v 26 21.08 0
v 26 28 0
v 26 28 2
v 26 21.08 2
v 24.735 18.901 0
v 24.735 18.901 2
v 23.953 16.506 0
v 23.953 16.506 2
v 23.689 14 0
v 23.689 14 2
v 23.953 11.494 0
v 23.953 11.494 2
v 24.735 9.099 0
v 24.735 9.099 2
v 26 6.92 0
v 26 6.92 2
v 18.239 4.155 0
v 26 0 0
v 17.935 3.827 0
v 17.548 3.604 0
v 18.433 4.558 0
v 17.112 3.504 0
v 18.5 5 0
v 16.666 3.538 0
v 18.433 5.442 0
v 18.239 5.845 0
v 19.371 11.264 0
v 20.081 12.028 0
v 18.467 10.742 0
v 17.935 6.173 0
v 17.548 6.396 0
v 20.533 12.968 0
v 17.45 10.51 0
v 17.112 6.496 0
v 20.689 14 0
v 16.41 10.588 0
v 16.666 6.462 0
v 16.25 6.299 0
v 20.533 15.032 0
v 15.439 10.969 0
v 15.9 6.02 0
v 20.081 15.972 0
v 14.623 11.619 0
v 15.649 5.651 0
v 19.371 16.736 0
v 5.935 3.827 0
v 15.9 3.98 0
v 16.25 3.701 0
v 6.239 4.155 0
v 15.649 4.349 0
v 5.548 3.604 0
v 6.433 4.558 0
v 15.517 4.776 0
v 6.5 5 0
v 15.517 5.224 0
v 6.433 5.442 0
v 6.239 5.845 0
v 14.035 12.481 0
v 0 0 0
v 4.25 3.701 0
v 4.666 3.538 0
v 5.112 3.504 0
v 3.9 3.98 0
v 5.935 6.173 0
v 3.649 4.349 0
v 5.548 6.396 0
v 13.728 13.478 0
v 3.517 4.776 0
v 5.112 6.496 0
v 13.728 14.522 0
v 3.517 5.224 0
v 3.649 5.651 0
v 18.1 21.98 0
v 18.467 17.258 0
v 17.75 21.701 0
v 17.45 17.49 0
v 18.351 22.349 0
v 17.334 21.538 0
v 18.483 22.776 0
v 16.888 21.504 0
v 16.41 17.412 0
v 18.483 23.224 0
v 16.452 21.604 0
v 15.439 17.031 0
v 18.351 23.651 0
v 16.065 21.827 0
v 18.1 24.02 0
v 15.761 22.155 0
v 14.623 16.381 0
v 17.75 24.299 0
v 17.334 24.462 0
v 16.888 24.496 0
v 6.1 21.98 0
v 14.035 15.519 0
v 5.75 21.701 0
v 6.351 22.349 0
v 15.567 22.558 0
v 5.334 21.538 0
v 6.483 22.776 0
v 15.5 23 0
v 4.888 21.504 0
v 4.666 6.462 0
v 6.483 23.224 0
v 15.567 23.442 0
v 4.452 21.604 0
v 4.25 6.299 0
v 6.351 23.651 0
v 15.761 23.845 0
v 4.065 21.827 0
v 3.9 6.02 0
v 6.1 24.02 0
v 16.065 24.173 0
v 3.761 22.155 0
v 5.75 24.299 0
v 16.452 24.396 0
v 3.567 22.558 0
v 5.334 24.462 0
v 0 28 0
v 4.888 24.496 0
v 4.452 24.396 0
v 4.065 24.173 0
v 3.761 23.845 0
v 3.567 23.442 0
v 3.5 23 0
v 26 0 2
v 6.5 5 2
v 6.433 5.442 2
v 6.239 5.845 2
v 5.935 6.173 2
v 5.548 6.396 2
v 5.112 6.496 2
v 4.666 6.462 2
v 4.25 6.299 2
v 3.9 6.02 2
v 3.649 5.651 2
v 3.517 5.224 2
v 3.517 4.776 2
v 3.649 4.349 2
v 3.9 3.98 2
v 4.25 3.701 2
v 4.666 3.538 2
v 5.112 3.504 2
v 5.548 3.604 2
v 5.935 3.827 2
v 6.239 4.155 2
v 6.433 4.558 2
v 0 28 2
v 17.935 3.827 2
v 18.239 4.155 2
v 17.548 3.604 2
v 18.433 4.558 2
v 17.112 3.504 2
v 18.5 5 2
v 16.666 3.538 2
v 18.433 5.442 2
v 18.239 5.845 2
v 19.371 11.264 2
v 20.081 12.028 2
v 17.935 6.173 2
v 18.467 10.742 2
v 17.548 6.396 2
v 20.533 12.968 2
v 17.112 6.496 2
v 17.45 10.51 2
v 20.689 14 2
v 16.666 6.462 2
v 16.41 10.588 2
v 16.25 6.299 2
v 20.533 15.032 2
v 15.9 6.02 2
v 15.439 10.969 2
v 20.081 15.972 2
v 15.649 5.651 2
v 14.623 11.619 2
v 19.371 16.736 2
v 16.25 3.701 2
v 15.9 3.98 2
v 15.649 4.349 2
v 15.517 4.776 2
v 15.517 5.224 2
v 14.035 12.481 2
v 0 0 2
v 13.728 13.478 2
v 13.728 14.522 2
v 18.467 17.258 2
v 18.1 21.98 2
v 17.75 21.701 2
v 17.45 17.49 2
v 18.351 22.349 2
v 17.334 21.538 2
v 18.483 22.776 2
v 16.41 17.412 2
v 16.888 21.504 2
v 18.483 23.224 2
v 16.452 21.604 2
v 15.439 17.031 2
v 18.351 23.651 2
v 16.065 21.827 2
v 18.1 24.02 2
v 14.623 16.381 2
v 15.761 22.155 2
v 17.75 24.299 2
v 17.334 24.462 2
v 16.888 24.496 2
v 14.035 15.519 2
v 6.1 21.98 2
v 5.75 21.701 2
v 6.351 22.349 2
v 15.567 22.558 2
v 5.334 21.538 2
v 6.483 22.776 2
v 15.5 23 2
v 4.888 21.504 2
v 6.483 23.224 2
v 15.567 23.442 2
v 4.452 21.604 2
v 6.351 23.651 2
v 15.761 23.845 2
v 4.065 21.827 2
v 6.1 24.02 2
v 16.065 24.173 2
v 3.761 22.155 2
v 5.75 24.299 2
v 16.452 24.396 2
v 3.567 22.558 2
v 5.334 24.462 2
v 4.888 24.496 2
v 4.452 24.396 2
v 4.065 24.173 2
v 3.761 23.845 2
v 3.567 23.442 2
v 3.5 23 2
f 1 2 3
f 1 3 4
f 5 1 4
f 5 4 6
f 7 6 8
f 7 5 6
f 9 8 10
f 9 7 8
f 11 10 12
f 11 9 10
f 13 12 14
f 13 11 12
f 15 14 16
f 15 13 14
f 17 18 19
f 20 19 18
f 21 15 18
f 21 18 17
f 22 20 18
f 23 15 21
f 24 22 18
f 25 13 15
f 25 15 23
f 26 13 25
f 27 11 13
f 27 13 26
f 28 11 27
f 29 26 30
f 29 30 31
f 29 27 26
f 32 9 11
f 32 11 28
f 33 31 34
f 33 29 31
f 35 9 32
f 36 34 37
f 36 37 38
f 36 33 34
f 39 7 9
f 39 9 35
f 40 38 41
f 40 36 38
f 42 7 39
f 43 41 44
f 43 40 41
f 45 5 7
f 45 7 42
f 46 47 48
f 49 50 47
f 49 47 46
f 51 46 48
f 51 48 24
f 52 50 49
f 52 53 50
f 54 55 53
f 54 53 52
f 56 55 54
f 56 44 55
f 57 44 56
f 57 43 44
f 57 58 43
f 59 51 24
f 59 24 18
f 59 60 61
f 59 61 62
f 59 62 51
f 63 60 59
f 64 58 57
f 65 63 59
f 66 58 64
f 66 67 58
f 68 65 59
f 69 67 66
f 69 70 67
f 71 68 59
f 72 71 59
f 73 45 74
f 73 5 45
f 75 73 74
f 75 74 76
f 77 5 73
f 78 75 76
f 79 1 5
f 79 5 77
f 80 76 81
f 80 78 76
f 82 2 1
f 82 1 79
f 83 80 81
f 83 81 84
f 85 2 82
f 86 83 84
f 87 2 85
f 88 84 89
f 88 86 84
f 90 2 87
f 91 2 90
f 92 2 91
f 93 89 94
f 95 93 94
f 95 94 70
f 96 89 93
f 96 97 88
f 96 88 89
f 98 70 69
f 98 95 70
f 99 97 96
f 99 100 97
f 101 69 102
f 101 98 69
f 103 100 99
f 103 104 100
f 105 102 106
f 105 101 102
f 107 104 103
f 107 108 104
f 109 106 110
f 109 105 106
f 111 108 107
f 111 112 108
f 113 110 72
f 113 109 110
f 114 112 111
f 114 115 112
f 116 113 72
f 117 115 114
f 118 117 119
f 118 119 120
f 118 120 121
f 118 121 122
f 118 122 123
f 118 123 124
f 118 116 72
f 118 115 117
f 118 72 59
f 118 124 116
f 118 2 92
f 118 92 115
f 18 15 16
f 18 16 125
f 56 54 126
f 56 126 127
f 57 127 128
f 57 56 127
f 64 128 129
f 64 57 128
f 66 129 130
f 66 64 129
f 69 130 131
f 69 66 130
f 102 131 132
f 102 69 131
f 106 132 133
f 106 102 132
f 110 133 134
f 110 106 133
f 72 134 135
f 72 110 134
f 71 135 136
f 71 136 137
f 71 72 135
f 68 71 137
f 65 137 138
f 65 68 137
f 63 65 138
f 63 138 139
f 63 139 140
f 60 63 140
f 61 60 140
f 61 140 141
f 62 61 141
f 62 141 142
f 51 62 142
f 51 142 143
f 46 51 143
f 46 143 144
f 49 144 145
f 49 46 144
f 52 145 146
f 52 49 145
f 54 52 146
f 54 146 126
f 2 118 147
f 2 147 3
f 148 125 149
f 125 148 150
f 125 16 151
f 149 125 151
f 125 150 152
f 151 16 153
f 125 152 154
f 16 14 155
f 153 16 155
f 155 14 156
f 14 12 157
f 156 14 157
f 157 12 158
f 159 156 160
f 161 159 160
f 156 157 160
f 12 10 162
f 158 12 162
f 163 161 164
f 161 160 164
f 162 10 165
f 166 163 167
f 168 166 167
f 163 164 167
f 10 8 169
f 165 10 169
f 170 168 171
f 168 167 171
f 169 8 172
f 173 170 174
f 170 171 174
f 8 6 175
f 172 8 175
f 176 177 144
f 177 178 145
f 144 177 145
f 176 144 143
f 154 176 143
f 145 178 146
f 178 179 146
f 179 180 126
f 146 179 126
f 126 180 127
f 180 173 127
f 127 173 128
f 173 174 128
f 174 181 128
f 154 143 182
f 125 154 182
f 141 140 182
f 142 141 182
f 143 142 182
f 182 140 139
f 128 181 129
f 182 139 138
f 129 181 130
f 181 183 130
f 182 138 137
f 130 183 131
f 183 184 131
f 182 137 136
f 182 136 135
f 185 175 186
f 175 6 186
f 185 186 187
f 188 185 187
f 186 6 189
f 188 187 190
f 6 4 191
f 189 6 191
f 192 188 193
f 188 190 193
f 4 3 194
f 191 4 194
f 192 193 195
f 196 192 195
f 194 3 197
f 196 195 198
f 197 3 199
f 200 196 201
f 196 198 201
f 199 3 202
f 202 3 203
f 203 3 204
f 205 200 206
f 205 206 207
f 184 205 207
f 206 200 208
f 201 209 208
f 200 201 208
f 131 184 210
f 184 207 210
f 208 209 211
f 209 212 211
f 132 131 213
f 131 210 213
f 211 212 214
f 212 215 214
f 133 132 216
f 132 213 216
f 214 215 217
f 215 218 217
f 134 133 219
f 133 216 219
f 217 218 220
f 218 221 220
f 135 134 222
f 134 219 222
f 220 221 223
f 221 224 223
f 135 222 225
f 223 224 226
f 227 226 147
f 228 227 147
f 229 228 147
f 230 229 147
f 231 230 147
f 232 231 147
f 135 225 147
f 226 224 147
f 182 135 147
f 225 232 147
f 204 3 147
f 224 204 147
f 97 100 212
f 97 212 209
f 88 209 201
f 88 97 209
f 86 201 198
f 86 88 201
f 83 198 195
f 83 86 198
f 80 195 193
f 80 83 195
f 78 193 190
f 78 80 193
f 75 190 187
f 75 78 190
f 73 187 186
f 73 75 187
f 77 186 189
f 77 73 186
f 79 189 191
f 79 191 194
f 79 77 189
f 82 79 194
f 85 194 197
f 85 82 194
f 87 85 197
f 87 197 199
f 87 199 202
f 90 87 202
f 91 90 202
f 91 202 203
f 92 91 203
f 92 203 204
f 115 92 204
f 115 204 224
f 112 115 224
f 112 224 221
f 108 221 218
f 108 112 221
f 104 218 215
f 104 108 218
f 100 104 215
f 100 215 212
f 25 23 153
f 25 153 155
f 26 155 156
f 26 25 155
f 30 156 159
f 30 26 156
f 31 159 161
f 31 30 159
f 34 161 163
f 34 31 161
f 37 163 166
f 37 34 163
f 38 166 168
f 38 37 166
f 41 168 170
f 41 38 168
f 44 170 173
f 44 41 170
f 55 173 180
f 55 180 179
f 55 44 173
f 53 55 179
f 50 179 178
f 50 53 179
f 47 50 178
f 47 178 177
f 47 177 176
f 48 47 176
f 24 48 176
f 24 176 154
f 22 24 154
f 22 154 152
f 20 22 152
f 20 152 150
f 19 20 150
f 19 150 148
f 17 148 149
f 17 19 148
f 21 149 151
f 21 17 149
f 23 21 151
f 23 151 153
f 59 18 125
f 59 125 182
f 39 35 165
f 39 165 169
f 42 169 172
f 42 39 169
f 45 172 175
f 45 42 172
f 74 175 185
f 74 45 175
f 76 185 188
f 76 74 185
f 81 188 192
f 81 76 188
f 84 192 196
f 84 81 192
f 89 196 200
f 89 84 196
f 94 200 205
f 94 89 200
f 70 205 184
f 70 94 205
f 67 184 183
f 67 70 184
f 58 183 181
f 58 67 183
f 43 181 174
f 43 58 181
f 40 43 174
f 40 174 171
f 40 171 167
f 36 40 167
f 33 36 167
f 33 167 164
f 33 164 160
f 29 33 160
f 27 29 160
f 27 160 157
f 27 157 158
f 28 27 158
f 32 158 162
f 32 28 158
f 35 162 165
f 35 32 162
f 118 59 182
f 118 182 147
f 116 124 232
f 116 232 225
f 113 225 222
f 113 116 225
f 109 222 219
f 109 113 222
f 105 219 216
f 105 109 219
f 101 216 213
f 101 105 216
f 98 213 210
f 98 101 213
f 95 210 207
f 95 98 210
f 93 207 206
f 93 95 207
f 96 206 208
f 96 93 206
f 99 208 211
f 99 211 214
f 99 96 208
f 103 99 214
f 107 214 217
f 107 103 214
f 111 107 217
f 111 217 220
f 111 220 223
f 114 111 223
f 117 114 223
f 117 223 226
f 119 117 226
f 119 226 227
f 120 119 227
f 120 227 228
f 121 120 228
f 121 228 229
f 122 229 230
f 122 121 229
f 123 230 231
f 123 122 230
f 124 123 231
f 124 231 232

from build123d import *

# Parameters (mm, degrees)
SZKIC1_R                    = 3.5
SZKIC1_R_2                  = 1.5
DODANIE_WYCI_GNI_CIE1_DEPTH = 2


with BuildPart() as part:
    # Szkic1 → Dodanie-wyciągnięcie1 (new body)
    with BuildSketch(Plane.XY):
        with BuildLine():
            Line((0, 0), (0, 28))
            Line((0, 28), (26, 28))
            Line((26, 28), (26, 21.080196399))
            ThreePointArc((26, 21.080196399), (23.68869542, 14), (26, 6.919803601))
            Line((26, 6.919803601), (26, 0))
            Line((26, 0), (0, 0))
        make_face()
        with Locations((17.18869542, 14)):
            Circle(SZKIC1_R, mode=Mode.SUBTRACT)
        with Locations((17, 5)):
            Circle(SZKIC1_R_2, mode=Mode.SUBTRACT)
        with Locations((5, 5)):
            Circle(SZKIC1_R_2, mode=Mode.SUBTRACT)
        with Locations(Location((17, 23, 0), (0, 0, 180))):
            Circle(SZKIC1_R_2, mode=Mode.SUBTRACT)
        with Locations(Location((5, 23, 0), (0, 0, 180))):
            Circle(SZKIC1_R_2, mode=Mode.SUBTRACT)
    extrude(amount=DODANIE_WYCI_GNI_CIE1_DEPTH)


solid = part.part
